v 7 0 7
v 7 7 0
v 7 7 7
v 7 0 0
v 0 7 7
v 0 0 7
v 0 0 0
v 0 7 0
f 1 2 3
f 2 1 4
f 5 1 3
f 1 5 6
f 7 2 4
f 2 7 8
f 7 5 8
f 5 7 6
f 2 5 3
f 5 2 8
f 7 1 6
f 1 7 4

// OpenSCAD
// file: lib/libdefs.scad
// Helper library for include_*/use_* cases (not a case itself).
libvar = 42;
echo("lib top-level echo");
function libf(x) = x * libvar;
module libm() { cube(libvar); }
cube(7);
// main file
include <lib/libdefs.scad>
libvar = 1;
echo("libf", libf(2));
libm();
